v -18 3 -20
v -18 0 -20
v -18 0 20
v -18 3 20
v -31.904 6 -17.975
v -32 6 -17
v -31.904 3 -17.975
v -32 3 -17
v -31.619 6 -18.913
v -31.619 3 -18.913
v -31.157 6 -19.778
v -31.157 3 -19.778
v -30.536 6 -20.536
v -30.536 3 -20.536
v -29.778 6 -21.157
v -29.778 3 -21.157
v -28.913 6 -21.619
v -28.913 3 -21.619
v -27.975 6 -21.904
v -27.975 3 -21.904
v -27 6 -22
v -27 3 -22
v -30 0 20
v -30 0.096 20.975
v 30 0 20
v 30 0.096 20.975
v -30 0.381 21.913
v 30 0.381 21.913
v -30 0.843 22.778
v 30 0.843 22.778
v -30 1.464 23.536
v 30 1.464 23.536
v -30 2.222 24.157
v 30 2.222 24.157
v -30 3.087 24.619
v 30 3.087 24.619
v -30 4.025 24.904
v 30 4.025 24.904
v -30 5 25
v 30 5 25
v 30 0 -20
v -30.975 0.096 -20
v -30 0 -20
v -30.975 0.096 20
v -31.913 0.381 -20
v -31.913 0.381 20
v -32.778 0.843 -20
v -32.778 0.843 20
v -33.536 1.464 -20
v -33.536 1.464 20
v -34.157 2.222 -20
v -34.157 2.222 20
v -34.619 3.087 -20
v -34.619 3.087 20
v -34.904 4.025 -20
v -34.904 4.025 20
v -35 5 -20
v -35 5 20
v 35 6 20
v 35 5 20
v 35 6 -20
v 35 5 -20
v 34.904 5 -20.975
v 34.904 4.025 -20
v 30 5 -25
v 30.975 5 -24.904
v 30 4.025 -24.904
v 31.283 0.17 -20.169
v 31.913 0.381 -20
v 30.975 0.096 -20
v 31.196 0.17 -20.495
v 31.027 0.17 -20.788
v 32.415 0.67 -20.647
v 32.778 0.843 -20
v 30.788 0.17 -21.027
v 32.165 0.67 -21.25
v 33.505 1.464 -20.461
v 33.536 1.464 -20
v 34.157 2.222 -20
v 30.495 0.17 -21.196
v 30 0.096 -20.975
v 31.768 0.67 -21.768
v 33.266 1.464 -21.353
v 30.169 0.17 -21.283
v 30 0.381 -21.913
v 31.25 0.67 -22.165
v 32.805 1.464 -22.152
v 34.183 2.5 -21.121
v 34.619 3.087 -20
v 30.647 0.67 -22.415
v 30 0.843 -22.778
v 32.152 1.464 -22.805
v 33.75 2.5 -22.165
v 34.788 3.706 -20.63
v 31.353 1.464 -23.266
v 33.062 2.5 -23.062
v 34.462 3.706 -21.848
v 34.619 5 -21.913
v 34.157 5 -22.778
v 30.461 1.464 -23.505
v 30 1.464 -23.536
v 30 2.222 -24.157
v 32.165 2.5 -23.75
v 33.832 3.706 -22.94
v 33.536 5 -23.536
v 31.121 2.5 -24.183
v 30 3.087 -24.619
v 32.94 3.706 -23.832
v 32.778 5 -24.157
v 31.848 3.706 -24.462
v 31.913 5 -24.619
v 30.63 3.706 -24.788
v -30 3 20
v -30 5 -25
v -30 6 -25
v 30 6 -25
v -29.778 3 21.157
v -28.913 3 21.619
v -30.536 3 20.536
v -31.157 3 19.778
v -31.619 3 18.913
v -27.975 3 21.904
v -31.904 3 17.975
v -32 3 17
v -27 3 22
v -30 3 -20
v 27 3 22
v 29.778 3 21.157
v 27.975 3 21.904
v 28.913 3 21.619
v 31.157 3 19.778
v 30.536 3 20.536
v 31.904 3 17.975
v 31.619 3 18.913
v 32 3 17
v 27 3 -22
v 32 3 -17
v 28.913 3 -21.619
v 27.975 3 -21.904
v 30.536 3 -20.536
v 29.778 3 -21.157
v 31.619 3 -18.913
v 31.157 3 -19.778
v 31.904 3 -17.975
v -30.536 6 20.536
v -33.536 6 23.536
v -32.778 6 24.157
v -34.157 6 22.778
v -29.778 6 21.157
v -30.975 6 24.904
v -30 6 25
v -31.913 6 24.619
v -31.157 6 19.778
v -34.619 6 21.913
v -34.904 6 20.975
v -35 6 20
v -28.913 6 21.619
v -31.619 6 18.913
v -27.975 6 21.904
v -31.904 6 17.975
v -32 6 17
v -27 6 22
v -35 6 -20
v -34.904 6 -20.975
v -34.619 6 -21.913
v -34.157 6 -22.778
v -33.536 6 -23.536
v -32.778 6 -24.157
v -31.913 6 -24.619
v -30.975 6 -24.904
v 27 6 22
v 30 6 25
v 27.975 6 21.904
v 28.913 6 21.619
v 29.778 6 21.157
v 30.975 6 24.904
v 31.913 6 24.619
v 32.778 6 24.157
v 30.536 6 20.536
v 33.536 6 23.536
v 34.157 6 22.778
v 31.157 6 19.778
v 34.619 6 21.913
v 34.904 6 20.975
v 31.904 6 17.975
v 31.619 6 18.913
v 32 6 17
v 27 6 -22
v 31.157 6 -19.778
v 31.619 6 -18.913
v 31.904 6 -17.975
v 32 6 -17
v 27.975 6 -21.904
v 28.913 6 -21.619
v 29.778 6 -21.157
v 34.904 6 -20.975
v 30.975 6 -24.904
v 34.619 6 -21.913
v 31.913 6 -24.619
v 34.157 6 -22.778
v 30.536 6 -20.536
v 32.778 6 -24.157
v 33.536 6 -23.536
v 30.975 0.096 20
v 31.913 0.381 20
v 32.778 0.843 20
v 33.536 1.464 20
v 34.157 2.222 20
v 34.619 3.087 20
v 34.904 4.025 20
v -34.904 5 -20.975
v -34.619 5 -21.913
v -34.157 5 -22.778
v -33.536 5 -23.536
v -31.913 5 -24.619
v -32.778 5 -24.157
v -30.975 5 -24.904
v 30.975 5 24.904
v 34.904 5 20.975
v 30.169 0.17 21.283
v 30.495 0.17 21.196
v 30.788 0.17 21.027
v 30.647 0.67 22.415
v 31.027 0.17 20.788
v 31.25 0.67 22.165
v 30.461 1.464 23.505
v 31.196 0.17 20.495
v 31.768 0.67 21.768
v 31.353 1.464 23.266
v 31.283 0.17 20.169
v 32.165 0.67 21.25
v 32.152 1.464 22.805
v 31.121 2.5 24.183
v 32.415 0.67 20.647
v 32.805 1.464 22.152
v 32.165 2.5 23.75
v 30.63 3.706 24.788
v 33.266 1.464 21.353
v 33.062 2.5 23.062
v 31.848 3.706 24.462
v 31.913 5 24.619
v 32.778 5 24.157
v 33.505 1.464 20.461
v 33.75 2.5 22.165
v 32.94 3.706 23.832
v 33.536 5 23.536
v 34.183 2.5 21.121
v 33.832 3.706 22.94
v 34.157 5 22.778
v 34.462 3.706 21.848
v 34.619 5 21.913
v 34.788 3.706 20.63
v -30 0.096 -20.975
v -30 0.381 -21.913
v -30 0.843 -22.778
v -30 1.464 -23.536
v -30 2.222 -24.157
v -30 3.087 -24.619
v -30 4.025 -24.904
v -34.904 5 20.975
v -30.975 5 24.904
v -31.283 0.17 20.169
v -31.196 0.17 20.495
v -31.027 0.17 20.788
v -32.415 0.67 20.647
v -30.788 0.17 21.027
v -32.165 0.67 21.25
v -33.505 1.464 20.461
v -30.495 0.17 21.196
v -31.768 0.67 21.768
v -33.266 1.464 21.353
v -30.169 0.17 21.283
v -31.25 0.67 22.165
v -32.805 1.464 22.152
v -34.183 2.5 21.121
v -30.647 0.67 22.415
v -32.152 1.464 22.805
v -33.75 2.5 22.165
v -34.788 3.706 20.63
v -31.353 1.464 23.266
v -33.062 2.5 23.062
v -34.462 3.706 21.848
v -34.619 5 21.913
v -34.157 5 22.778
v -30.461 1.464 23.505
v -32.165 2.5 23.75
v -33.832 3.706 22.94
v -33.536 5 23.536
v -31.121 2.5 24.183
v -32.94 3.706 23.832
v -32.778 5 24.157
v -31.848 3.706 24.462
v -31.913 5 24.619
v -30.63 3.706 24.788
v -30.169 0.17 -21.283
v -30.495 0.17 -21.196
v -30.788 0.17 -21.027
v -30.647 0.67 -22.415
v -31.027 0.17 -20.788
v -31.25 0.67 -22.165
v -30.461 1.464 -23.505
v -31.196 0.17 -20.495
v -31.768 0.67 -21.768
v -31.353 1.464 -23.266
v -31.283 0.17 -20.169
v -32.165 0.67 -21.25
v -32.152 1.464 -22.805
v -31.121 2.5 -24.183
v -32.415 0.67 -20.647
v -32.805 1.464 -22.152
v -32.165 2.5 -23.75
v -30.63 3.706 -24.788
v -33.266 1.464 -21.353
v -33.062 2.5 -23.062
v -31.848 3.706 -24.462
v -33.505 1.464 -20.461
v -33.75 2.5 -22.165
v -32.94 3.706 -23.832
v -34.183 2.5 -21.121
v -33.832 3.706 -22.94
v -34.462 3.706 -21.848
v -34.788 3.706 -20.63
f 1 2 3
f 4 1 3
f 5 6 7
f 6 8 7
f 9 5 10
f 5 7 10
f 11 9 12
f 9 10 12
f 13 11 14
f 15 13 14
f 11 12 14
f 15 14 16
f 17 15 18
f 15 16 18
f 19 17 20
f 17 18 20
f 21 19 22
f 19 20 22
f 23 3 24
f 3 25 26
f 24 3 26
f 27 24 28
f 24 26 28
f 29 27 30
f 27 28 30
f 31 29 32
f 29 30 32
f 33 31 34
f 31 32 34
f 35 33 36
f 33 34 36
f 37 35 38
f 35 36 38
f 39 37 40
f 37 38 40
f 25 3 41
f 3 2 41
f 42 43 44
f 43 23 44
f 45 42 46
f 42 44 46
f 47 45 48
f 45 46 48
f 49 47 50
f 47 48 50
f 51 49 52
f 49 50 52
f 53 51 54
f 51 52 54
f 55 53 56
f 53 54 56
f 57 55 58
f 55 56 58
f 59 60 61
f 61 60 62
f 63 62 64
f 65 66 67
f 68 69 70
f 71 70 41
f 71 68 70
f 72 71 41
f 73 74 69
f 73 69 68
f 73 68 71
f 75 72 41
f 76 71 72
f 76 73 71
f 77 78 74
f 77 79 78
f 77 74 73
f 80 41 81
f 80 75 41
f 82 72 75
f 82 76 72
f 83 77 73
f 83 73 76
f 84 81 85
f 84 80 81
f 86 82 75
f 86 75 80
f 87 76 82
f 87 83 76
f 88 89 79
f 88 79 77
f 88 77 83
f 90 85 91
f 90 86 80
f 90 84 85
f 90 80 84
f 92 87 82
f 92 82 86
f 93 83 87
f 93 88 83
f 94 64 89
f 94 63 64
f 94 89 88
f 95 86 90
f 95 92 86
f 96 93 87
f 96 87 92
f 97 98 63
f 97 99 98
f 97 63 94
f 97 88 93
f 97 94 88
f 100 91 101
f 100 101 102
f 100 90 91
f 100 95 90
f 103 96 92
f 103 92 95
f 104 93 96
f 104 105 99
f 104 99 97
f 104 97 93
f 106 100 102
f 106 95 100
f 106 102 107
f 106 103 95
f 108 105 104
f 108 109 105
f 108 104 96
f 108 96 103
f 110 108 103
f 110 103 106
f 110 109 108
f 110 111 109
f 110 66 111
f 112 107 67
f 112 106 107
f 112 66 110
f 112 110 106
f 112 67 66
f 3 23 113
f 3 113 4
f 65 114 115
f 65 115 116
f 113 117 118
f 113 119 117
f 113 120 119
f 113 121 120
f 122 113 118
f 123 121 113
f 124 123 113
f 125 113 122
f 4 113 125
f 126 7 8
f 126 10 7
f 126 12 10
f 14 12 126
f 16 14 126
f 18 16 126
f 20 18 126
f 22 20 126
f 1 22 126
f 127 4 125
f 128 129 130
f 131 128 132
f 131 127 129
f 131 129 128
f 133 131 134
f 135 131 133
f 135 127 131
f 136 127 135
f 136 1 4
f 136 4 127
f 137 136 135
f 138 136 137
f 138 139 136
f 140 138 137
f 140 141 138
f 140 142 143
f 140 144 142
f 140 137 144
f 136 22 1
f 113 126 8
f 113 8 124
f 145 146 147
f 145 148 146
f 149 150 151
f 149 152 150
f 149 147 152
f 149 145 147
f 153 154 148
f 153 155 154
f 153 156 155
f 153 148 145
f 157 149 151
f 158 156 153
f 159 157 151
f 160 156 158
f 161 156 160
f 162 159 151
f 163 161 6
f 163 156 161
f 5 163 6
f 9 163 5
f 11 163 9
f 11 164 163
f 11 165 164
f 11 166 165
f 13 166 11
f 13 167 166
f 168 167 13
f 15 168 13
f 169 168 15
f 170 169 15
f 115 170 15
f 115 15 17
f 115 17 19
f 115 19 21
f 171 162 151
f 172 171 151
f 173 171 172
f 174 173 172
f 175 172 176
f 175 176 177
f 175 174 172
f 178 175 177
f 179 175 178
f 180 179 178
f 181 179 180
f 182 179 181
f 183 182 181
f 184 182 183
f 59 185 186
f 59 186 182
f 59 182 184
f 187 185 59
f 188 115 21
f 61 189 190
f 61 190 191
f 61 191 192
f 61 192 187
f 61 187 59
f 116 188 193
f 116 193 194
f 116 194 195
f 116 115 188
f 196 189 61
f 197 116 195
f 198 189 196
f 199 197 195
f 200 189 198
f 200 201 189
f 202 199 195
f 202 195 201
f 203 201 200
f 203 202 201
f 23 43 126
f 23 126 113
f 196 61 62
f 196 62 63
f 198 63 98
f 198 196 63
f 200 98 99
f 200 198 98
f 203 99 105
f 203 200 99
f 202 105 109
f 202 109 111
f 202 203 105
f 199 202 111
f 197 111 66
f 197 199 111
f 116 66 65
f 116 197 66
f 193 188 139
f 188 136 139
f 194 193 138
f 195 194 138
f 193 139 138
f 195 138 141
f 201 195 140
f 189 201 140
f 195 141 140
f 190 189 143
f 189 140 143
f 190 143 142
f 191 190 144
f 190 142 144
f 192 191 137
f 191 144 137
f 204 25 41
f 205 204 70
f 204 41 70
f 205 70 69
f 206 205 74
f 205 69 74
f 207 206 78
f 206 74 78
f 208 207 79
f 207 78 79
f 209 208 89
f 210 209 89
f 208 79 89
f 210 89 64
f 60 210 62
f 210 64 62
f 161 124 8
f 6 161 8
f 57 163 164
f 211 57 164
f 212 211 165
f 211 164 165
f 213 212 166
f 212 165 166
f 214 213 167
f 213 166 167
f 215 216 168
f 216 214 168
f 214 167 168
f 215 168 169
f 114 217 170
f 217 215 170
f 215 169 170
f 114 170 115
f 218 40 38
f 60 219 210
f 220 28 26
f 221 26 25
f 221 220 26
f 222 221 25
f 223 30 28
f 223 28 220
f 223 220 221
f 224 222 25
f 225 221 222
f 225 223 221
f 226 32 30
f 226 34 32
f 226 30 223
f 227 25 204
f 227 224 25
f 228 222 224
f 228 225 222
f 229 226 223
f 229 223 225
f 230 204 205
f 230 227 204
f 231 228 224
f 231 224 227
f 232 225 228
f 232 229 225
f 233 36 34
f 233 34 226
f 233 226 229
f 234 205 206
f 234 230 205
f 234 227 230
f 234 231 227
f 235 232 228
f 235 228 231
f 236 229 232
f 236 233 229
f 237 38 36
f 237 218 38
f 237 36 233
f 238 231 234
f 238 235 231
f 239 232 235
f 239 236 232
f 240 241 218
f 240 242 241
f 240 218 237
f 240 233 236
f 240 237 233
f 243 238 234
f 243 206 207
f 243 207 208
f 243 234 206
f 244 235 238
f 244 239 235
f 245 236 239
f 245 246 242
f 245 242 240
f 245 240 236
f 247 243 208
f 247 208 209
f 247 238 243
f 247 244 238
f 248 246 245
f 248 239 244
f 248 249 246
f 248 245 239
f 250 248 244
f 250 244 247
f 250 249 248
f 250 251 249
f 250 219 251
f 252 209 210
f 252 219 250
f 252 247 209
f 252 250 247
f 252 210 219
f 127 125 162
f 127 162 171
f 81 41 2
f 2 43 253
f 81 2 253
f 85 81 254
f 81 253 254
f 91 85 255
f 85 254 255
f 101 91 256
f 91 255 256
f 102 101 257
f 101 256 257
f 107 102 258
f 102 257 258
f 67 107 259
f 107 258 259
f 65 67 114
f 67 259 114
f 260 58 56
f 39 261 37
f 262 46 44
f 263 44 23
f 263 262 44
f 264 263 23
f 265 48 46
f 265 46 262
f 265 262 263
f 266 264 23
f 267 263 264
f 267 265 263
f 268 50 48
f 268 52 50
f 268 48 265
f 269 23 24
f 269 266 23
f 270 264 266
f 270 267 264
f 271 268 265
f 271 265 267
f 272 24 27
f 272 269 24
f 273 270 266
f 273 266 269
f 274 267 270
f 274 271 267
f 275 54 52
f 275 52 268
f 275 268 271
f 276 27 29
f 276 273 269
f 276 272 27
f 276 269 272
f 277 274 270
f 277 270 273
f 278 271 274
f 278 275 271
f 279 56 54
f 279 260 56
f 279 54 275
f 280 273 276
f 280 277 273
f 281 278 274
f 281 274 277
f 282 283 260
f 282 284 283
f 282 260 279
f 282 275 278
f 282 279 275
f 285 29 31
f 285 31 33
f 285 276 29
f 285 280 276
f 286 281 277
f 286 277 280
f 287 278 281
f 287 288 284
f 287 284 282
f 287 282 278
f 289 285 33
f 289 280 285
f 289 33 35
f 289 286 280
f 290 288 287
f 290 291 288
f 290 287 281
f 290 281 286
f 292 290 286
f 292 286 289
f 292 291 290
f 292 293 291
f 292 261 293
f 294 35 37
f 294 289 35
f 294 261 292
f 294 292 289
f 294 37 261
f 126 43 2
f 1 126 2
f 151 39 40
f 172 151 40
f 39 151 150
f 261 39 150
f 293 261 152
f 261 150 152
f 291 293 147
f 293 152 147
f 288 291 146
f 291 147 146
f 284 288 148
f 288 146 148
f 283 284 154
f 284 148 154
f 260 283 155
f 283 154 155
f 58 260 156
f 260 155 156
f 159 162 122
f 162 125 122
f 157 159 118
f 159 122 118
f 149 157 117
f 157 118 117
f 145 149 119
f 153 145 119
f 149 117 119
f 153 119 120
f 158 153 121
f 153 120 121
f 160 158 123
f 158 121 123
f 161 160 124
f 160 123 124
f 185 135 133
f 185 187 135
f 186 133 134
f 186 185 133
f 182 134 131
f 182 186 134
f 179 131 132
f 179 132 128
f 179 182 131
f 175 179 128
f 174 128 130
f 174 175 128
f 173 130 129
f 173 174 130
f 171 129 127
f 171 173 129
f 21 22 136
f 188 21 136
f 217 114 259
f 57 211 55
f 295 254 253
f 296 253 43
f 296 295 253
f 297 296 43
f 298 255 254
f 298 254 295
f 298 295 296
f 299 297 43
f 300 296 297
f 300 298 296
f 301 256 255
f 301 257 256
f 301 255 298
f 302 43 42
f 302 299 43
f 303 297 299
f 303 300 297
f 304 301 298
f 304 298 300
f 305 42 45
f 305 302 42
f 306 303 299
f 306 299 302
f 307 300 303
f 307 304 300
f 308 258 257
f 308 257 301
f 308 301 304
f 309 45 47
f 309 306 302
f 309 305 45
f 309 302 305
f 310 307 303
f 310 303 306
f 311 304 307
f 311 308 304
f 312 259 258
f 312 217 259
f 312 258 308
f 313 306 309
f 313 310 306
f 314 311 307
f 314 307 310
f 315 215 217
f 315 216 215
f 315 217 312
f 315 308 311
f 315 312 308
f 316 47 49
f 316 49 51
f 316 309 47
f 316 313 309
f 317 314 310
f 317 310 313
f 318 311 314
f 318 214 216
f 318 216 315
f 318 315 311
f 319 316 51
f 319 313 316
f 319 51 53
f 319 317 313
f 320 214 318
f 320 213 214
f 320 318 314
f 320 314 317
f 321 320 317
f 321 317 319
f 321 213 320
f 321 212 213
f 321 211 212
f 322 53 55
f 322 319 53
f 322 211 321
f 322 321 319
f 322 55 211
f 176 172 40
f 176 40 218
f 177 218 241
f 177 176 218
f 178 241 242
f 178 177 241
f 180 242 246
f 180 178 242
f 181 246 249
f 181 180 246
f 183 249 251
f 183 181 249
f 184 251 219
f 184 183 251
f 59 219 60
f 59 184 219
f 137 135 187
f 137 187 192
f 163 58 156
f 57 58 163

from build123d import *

# Parameters (mm, degrees)
SKETCH1_W               = 70
SKETCH1_H               = 50
BOSS_EXTRUDE1_DEPTH     = 6
SHELL1_T                = -3
FILLET1_R               = 5
FILLET2_R               = 5
FILLET3_R               = 5
FILLET4_R               = 5
FILLET5_R               = 5
FILLET6_R               = 5
FILLET7_R               = 5
FILLET8_R               = 5
FILLET9_R               = 5
CUT_EXTRUDE1_DEPTH      = 10
CUT_EXTRUDE1_DEPTH_BACK = 10
SKETCH2_W               = 12
SKETCH2_H               = 40


with BuildPart() as part:
    # Sketch1 → Boss-Extrude1 (new body)
    with BuildSketch(Plane(origin=(0, 0, 0), x_dir=(1, 0, 0), z_dir=(0, 1, 0))):
        Rectangle(SKETCH1_W, SKETCH1_H)
    extrude(amount=BOSS_EXTRUDE1_DEPTH)

    # Shell1
    shell1_openings = [part.faces().sort_by_distance(p)[0] for p in [
        (0, 6, 0),
    ]]
    offset(amount=SHELL1_T, openings=shell1_openings, kind=Kind.INTERSECTION)

    # Fillet1
    fillet1_edges = [part.edges().sort_by_distance(p)[0] for p in [
        (35, 3, 25),
    ]]
    fillet(fillet1_edges, radius=FILLET1_R)

    # Fillet2
    fillet2_edges = [part.edges().sort_by_distance(p)[0] for p in [
        (35, 3, -25),
    ]]
    fillet(fillet2_edges, radius=FILLET2_R)

    # Fillet3
    fillet3_edges = [part.edges().sort_by_distance(p)[0] for p in [
        (-35, 3, 25),
    ]]
    fillet(fillet3_edges, radius=FILLET3_R)

    # Fillet4
    fillet4_edges = [part.edges().sort_by_distance(p)[0] for p in [
        (-35, 3, -25),
    ]]
    fillet(fillet4_edges, radius=FILLET4_R)

    # Fillet5
    fillet5_edges = [part.edges().sort_by_distance(p)[0] for p in [
        (-33.535533906, 0, -23.535533906),
        (-33.535533906, 0, 23.535533906),
        (33.535533906, 0, -23.535533906),
        (33.535533906, 0, 23.535533906),
        (35, 0, 0),
        (0, 0, -25),
        (-35, 0, 0),
        (0, 0, 25),
    ]]
    fillet(fillet5_edges, radius=FILLET5_R)

    # Fillet6
    fillet6_edges = [part.edges().sort_by_distance(p)[0] for p in [
        (32, 4.5, 22),
    ]]
    fillet(fillet6_edges, radius=FILLET6_R)

    # Fillet7
    fillet7_edges = [part.edges().sort_by_distance(p)[0] for p in [
        (-32, 4.5, 22),
    ]]
    fillet(fillet7_edges, radius=FILLET7_R)

    # Fillet8
    fillet8_edges = [part.edges().sort_by_distance(p)[0] for p in [
        (-32, 4.5, -22),
    ]]
    fillet(fillet8_edges, radius=FILLET8_R)

    # Fillet9
    fillet9_edges = [part.edges().sort_by_distance(p)[0] for p in [
        (32, 4.5, -22),
    ]]
    fillet(fillet9_edges, radius=FILLET9_R)

    # Sketch2 → Cut-Extrude1 (cut, two sides: drawn at the far end of the back side and taken through both)
    with BuildSketch(Plane.XZ.offset(-CUT_EXTRUDE1_DEPTH_BACK)):
        with Locations((-24, 0)):
            Rectangle(SKETCH2_W, SKETCH2_H)
    extrude(amount=CUT_EXTRUDE1_DEPTH + CUT_EXTRUDE1_DEPTH_BACK, mode=Mode.SUBTRACT)


solid = part.part
